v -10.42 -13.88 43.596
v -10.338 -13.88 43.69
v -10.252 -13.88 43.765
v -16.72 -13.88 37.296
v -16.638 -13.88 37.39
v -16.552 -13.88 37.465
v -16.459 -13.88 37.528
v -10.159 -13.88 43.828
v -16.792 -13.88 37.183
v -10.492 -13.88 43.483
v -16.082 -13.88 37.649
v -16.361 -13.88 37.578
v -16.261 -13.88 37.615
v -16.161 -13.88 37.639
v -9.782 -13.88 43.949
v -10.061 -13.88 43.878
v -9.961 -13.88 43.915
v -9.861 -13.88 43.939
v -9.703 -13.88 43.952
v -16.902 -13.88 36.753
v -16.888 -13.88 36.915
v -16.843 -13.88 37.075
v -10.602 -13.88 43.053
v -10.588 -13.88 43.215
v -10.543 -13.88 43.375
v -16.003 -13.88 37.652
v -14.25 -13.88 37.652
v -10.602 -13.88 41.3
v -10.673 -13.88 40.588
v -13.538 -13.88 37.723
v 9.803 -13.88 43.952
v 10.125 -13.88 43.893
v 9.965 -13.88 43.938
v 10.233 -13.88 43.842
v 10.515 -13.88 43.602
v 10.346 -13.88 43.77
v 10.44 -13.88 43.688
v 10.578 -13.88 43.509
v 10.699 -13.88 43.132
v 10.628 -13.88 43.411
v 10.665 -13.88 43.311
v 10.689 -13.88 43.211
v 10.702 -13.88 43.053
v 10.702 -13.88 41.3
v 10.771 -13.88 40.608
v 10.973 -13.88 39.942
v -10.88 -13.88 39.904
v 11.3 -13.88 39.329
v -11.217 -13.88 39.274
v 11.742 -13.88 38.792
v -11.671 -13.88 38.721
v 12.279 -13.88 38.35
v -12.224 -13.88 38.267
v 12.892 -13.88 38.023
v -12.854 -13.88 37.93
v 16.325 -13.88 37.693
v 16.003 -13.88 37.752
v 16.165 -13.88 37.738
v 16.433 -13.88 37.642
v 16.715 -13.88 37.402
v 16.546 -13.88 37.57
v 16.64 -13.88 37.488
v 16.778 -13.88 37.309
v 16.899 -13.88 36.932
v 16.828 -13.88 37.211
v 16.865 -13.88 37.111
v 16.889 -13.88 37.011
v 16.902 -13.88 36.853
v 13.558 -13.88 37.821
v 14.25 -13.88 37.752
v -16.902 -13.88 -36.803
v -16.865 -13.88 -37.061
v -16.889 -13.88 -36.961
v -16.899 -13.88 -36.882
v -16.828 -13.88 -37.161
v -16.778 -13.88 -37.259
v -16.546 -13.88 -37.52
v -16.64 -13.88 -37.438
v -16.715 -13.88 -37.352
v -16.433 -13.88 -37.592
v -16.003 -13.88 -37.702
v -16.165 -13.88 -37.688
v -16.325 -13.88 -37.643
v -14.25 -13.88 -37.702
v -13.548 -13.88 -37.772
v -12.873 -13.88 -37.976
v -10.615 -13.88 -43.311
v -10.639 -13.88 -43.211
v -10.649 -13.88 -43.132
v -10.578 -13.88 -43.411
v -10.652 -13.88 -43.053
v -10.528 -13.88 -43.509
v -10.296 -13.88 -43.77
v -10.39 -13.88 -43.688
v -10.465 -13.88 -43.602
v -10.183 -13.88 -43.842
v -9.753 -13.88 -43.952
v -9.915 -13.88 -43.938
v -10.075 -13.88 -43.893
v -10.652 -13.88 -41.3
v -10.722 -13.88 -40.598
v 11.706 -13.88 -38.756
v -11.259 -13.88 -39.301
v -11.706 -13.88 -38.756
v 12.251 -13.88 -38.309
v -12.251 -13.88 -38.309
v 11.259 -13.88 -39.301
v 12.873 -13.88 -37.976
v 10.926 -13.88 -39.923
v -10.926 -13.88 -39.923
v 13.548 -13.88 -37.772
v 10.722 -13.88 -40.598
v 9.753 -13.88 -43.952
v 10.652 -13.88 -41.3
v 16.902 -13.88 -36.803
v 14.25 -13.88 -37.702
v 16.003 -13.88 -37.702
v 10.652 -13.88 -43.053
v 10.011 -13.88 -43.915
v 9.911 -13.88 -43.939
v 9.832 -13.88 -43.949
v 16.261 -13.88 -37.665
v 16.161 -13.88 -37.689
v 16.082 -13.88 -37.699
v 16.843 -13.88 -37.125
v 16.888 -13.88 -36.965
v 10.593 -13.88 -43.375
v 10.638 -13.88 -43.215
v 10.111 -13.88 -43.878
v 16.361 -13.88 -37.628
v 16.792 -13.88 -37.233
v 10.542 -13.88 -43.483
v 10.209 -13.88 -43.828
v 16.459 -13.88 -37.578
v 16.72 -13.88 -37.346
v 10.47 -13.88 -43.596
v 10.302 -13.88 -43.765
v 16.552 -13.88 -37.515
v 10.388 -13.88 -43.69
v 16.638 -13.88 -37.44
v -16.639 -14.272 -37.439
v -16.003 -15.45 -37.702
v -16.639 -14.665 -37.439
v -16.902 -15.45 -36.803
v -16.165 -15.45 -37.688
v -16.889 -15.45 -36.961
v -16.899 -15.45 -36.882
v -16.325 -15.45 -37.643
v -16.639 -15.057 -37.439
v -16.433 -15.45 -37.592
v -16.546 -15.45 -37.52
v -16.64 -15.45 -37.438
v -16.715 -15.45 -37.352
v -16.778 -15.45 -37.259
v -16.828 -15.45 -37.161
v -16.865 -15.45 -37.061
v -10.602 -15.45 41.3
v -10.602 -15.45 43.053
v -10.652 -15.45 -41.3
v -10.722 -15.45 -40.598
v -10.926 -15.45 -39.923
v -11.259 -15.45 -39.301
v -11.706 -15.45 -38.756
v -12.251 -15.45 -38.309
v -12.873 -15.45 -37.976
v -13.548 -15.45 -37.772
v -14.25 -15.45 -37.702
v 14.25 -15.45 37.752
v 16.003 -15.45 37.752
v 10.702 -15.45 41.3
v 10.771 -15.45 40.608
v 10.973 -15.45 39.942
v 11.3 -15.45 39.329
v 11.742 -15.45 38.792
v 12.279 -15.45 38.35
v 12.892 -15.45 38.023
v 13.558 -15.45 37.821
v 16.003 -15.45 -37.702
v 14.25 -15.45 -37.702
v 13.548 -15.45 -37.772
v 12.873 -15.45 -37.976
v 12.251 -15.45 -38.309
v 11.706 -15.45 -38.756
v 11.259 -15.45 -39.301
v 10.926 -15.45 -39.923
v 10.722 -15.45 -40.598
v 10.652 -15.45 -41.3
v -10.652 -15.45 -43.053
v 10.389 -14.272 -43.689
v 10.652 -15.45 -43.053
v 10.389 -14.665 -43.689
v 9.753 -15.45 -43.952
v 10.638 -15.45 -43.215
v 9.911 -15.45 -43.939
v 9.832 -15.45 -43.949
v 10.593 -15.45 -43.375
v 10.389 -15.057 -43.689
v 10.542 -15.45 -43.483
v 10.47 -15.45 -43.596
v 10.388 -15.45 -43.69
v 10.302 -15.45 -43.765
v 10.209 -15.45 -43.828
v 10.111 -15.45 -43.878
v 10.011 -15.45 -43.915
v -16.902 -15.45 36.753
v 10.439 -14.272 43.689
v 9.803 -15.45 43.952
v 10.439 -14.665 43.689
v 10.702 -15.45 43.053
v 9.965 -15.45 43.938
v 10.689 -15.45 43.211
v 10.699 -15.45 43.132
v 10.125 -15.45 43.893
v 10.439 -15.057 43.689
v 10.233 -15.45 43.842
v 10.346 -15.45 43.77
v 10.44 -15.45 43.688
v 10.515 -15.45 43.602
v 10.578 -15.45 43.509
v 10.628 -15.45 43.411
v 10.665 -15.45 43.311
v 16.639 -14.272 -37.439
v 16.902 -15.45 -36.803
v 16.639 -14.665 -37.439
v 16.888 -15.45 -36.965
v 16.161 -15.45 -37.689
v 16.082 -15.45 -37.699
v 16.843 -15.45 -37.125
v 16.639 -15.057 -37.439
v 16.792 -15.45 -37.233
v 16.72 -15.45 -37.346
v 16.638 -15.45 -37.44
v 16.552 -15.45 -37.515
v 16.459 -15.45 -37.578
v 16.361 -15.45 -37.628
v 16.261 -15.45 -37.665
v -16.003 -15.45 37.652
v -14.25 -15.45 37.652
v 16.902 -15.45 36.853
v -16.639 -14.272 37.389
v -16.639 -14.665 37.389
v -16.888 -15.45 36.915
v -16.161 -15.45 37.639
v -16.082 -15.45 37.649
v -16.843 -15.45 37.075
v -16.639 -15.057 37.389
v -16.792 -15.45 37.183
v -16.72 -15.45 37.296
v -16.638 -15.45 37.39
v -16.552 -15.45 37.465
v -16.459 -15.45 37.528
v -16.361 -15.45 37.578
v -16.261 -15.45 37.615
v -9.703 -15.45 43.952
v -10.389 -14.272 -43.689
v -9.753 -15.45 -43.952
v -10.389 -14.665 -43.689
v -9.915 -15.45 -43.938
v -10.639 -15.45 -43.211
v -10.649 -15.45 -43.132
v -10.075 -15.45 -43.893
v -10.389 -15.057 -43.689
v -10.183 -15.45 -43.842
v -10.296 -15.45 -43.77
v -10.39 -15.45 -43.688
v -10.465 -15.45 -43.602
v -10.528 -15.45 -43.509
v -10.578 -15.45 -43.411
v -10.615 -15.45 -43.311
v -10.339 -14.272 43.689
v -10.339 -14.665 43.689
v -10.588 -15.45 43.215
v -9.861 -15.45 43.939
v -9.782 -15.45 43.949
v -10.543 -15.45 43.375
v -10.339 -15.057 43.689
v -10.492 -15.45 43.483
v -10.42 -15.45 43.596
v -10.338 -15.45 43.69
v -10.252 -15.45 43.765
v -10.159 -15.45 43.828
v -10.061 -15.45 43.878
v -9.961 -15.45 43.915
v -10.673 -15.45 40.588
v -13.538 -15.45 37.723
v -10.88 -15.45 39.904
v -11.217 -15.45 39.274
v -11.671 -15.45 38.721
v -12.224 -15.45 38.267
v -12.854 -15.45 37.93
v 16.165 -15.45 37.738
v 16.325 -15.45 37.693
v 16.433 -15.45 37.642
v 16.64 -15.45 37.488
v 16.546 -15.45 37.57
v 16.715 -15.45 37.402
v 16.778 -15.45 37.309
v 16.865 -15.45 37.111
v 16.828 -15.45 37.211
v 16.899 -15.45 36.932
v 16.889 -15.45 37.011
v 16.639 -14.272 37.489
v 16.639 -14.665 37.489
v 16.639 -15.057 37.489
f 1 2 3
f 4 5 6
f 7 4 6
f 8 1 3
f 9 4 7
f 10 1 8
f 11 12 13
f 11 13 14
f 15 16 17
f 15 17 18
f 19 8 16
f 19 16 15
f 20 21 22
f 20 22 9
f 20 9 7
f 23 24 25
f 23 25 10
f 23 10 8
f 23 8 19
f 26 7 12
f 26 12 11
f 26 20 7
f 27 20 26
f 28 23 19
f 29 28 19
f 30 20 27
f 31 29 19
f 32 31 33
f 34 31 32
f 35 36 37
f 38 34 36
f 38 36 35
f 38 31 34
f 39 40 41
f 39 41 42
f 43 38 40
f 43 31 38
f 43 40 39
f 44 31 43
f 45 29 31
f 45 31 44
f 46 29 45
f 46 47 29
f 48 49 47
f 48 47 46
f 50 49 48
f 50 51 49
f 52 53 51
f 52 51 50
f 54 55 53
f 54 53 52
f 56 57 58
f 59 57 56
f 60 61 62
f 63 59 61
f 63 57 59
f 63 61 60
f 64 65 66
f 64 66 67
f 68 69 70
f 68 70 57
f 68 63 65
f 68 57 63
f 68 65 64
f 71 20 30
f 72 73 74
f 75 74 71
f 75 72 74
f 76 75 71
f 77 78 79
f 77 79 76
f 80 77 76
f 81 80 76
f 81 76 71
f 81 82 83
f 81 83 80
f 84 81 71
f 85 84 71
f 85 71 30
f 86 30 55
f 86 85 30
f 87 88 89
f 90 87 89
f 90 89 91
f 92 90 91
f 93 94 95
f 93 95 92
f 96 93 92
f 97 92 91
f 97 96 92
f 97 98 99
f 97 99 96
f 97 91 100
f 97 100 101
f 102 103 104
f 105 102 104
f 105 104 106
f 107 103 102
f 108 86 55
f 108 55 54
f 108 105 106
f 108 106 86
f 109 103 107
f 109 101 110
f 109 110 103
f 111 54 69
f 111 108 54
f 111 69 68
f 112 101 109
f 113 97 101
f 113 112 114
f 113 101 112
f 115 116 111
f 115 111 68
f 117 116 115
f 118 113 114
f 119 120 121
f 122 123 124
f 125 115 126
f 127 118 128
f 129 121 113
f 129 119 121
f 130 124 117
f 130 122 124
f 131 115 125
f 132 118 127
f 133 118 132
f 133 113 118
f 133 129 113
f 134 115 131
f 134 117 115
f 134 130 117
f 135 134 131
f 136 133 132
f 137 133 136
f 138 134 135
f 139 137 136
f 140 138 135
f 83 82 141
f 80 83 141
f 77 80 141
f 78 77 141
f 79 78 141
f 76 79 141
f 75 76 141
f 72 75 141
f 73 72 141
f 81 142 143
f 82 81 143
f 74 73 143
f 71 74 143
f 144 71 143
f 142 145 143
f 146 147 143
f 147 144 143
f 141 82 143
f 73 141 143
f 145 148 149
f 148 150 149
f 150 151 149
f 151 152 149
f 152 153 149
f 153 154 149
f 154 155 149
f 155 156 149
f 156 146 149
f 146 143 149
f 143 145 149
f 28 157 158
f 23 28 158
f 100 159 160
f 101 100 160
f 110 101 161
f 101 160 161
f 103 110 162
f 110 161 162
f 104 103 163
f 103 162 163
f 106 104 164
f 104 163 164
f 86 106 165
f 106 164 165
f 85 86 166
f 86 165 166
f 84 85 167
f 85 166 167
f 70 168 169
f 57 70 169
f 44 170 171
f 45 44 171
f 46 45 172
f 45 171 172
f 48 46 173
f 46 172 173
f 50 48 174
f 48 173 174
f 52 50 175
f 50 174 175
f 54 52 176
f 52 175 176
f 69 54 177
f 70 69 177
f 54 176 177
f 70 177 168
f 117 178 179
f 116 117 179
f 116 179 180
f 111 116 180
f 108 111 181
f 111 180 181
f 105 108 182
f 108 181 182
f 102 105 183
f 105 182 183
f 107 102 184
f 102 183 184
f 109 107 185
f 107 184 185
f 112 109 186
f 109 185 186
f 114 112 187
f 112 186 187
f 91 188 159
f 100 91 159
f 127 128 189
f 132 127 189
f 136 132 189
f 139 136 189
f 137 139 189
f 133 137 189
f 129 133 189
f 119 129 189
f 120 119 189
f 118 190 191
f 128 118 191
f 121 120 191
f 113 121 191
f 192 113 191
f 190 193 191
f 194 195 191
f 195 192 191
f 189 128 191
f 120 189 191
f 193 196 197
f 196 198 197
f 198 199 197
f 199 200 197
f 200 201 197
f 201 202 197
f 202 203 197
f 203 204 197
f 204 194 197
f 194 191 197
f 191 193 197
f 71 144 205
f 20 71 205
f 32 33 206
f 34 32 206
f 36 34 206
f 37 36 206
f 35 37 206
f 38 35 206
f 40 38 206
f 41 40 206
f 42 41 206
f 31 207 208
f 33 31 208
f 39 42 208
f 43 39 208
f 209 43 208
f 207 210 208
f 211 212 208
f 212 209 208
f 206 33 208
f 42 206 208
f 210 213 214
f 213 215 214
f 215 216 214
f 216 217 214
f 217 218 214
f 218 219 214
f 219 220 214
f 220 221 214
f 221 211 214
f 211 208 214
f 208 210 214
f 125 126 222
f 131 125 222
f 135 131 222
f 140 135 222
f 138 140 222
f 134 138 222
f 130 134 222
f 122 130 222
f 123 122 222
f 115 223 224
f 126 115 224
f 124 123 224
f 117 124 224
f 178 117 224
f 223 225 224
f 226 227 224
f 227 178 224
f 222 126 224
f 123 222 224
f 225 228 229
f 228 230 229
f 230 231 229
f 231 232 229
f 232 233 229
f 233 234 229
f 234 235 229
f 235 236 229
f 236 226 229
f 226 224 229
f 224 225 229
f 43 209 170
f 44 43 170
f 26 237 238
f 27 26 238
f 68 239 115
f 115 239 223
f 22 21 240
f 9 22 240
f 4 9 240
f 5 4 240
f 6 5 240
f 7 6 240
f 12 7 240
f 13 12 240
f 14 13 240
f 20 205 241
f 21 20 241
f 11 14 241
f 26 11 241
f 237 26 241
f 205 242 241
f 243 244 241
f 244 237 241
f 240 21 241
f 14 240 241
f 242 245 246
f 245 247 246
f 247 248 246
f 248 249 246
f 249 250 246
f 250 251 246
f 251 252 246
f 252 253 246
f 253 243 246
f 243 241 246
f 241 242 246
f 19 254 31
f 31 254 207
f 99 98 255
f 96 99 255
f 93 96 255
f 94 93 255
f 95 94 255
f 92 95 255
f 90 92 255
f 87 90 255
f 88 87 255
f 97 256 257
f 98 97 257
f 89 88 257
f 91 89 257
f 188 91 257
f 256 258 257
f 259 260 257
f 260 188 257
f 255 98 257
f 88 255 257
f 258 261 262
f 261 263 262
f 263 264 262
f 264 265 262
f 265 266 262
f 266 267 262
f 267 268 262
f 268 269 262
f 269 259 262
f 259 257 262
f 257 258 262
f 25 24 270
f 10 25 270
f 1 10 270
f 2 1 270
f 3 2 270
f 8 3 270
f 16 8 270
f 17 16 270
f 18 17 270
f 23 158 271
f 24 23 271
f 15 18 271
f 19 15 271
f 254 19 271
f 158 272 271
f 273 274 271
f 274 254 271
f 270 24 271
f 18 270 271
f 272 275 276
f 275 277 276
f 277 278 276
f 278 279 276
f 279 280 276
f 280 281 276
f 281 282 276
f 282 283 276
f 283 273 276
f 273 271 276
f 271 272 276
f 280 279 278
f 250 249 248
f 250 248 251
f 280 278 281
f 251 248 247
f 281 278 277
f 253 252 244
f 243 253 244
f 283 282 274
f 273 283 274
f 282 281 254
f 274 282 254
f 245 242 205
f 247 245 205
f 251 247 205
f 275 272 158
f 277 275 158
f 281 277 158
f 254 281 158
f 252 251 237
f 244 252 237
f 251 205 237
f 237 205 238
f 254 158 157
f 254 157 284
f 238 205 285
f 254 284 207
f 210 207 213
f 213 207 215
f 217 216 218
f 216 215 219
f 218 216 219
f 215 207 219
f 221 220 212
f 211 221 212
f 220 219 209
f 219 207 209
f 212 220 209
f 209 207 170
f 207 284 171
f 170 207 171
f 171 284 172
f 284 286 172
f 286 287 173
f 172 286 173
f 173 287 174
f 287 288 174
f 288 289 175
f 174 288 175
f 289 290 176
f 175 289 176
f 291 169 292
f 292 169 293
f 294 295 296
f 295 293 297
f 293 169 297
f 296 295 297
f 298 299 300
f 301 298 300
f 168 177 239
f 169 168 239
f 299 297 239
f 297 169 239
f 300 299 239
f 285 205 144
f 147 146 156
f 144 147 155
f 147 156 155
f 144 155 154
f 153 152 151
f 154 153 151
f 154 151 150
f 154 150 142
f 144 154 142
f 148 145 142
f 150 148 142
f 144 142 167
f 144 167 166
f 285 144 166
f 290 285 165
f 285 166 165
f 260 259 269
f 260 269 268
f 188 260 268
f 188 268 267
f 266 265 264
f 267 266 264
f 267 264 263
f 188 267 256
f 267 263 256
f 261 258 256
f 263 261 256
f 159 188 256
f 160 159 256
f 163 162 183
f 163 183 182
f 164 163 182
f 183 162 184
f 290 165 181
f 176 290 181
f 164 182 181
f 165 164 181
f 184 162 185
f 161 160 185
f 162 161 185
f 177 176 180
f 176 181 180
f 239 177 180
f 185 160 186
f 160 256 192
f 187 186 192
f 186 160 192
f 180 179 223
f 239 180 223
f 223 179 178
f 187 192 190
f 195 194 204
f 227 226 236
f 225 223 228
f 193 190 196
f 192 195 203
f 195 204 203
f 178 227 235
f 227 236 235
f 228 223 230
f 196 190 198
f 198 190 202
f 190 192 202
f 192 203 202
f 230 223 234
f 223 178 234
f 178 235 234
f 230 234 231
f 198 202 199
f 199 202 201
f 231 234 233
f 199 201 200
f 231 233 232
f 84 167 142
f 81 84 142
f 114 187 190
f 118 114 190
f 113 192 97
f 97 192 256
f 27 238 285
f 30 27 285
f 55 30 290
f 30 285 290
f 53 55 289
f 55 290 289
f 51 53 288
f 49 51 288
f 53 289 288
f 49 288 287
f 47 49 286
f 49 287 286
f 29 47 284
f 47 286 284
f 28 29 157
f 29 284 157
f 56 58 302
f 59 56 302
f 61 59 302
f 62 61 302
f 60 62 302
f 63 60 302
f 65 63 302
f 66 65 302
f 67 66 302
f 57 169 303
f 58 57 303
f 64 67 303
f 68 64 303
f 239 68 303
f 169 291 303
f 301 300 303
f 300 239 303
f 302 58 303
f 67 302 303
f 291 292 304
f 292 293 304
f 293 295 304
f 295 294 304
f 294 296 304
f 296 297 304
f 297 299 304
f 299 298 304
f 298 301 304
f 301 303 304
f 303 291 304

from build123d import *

# Parameters (mm, degrees)
EFFECTSBOARD_DEPTH = 1.57


with BuildPart() as part:
    # Sketch2 → EffectsBoard (new body)
    with BuildSketch(Plane(origin=(0, -15.44984767, 0), x_dir=(-1, 0, 0), z_dir=(0, -1, 0))):
        with BuildLine():
            Line((9.702810165, -43.95246749), (-9.802810165, -43.95246749))
            add(Edge.make_bspline(
                [(-9.802810165, -43.95246749), (-9.915209225, -43.95246749), (-10.13503537, -43.913811014), (-10.458796653, -43.708796653), (-10.663811014, -43.38503537), (-10.70246749, -43.165209225), (-10.70246749, -43.052810165)],
                knots=[0, 0, 0, 0, 0.25, 0.5, 0.75, 1, 1, 1, 1], degree=3))
            Line((-10.70246749, -43.052810165), (-10.70246749, -41.3))
            ThreePointArc((-10.70246749, -41.3), (-11.741515706, -38.791515706), (-14.25, -37.75246749))
            Line((-14.25, -37.75246749), (-16.002810165, -37.75246749))
            add(Edge.make_bspline(
                [(-16.002810165, -37.75246749), (-16.115209225, -37.75246749), (-16.33503537, -37.713811014), (-16.658796653, -37.508796653), (-16.863811014, -37.18503537), (-16.90246749, -36.965209225), (-16.90246749, -36.852810165)],
                knots=[0, 0, 0, 0, 0.25, 0.5, 0.75, 1, 1, 1, 1], degree=3))
            Line((-16.90246749, -36.852810165), (-16.90246749, 36.802810165))
            add(Edge.make_bspline(
                [(-16.90246749, 36.802810165), (-16.90246749, 36.915209225), (-16.863811014, 37.13503537), (-16.658796653, 37.458796653), (-16.33503537, 37.663811014), (-16.115209225, 37.70246749), (-16.002810165, 37.70246749)],
                knots=[0, 0, 0, 0, 0.25, 0.5, 0.75, 1, 1, 1, 1], degree=3))
            Line((-16.002810165, 37.70246749), (-14.25, 37.70246749))
            ThreePointArc((-14.25, 37.70246749), (-11.706160367, 38.756160367), (-10.65246749, 41.3))
            Line((-10.65246749, 41.3), (-10.65246749, 43.052810165))
            add(Edge.make_bspline(
                [(-10.65246749, 43.052810165), (-10.65246749, 43.165209225), (-10.613811014, 43.38503537), (-10.408796653, 43.708796653), (-10.08503537, 43.913811014), (-9.865209225, 43.95246749), (-9.752810165, 43.95246749)],
                knots=[0, 0, 0, 0, 0.25, 0.5, 0.75, 1, 1, 1, 1], degree=3))
            Line((-9.752810165, 43.95246749), (9.752810165, 43.95246749))
            add(Edge.make_bspline(
                [(9.752810165, 43.95246749), (9.865209225, 43.95246749), (10.08503537, 43.913811014), (10.408796653, 43.708796653), (10.613811014, 43.38503537), (10.65246749, 43.165209225), (10.65246749, 43.052810165)],
                knots=[0, 0, 0, 0, 0.25, 0.5, 0.75, 1, 1, 1, 1], degree=3))
            Line((10.65246749, 43.052810165), (10.65246749, 41.3))
            ThreePointArc((10.65246749, 41.3), (11.706160367, 38.756160367), (14.25, 37.70246749))
            Line((14.25, 37.70246749), (16.002810165, 37.70246749))
            add(Edge.make_bspline(
                [(16.002810165, 37.70246749), (16.115209225, 37.70246749), (16.33503537, 37.663811014), (16.658796653, 37.458796653), (16.863811014, 37.13503537), (16.90246749, 36.915209225), (16.90246749, 36.802810165)],
                knots=[0, 0, 0, 0, 0.25, 0.5, 0.75, 1, 1, 1, 1], degree=3))
            Line((16.90246749, 36.802810165), (16.90246749, -36.752810165))
            add(Edge.make_bspline(
                [(16.90246749, -36.752810165), (16.90246749, -36.865209225), (16.863811014, -37.08503537), (16.658796653, -37.408796653), (16.33503537, -37.613811014), (16.115209225, -37.65246749), (16.002810165, -37.65246749)],
                knots=[0, 0, 0, 0, 0.25, 0.5, 0.75, 1, 1, 1, 1], degree=3))
            Line((16.002810165, -37.65246749), (14.25, -37.65246749))
            ThreePointArc((14.25, -37.65246749), (11.670805028, -38.720805028), (10.60246749, -41.3))
            Line((10.60246749, -41.3), (10.60246749, -43.052810165))
            add(Edge.make_bspline(
                [(10.60246749, -43.052810165), (10.60246749, -43.165209225), (10.563811014, -43.38503537), (10.358796653, -43.708796653), (10.03503537, -43.913811014), (9.815209225, -43.95246749), (9.702810165, -43.95246749)],
                knots=[0, 0, 0, 0, 0.25, 0.5, 0.75, 1, 1, 1, 1], degree=3))
        make_face()
    extrude(amount=-EFFECTSBOARD_DEPTH)


solid = part.part
